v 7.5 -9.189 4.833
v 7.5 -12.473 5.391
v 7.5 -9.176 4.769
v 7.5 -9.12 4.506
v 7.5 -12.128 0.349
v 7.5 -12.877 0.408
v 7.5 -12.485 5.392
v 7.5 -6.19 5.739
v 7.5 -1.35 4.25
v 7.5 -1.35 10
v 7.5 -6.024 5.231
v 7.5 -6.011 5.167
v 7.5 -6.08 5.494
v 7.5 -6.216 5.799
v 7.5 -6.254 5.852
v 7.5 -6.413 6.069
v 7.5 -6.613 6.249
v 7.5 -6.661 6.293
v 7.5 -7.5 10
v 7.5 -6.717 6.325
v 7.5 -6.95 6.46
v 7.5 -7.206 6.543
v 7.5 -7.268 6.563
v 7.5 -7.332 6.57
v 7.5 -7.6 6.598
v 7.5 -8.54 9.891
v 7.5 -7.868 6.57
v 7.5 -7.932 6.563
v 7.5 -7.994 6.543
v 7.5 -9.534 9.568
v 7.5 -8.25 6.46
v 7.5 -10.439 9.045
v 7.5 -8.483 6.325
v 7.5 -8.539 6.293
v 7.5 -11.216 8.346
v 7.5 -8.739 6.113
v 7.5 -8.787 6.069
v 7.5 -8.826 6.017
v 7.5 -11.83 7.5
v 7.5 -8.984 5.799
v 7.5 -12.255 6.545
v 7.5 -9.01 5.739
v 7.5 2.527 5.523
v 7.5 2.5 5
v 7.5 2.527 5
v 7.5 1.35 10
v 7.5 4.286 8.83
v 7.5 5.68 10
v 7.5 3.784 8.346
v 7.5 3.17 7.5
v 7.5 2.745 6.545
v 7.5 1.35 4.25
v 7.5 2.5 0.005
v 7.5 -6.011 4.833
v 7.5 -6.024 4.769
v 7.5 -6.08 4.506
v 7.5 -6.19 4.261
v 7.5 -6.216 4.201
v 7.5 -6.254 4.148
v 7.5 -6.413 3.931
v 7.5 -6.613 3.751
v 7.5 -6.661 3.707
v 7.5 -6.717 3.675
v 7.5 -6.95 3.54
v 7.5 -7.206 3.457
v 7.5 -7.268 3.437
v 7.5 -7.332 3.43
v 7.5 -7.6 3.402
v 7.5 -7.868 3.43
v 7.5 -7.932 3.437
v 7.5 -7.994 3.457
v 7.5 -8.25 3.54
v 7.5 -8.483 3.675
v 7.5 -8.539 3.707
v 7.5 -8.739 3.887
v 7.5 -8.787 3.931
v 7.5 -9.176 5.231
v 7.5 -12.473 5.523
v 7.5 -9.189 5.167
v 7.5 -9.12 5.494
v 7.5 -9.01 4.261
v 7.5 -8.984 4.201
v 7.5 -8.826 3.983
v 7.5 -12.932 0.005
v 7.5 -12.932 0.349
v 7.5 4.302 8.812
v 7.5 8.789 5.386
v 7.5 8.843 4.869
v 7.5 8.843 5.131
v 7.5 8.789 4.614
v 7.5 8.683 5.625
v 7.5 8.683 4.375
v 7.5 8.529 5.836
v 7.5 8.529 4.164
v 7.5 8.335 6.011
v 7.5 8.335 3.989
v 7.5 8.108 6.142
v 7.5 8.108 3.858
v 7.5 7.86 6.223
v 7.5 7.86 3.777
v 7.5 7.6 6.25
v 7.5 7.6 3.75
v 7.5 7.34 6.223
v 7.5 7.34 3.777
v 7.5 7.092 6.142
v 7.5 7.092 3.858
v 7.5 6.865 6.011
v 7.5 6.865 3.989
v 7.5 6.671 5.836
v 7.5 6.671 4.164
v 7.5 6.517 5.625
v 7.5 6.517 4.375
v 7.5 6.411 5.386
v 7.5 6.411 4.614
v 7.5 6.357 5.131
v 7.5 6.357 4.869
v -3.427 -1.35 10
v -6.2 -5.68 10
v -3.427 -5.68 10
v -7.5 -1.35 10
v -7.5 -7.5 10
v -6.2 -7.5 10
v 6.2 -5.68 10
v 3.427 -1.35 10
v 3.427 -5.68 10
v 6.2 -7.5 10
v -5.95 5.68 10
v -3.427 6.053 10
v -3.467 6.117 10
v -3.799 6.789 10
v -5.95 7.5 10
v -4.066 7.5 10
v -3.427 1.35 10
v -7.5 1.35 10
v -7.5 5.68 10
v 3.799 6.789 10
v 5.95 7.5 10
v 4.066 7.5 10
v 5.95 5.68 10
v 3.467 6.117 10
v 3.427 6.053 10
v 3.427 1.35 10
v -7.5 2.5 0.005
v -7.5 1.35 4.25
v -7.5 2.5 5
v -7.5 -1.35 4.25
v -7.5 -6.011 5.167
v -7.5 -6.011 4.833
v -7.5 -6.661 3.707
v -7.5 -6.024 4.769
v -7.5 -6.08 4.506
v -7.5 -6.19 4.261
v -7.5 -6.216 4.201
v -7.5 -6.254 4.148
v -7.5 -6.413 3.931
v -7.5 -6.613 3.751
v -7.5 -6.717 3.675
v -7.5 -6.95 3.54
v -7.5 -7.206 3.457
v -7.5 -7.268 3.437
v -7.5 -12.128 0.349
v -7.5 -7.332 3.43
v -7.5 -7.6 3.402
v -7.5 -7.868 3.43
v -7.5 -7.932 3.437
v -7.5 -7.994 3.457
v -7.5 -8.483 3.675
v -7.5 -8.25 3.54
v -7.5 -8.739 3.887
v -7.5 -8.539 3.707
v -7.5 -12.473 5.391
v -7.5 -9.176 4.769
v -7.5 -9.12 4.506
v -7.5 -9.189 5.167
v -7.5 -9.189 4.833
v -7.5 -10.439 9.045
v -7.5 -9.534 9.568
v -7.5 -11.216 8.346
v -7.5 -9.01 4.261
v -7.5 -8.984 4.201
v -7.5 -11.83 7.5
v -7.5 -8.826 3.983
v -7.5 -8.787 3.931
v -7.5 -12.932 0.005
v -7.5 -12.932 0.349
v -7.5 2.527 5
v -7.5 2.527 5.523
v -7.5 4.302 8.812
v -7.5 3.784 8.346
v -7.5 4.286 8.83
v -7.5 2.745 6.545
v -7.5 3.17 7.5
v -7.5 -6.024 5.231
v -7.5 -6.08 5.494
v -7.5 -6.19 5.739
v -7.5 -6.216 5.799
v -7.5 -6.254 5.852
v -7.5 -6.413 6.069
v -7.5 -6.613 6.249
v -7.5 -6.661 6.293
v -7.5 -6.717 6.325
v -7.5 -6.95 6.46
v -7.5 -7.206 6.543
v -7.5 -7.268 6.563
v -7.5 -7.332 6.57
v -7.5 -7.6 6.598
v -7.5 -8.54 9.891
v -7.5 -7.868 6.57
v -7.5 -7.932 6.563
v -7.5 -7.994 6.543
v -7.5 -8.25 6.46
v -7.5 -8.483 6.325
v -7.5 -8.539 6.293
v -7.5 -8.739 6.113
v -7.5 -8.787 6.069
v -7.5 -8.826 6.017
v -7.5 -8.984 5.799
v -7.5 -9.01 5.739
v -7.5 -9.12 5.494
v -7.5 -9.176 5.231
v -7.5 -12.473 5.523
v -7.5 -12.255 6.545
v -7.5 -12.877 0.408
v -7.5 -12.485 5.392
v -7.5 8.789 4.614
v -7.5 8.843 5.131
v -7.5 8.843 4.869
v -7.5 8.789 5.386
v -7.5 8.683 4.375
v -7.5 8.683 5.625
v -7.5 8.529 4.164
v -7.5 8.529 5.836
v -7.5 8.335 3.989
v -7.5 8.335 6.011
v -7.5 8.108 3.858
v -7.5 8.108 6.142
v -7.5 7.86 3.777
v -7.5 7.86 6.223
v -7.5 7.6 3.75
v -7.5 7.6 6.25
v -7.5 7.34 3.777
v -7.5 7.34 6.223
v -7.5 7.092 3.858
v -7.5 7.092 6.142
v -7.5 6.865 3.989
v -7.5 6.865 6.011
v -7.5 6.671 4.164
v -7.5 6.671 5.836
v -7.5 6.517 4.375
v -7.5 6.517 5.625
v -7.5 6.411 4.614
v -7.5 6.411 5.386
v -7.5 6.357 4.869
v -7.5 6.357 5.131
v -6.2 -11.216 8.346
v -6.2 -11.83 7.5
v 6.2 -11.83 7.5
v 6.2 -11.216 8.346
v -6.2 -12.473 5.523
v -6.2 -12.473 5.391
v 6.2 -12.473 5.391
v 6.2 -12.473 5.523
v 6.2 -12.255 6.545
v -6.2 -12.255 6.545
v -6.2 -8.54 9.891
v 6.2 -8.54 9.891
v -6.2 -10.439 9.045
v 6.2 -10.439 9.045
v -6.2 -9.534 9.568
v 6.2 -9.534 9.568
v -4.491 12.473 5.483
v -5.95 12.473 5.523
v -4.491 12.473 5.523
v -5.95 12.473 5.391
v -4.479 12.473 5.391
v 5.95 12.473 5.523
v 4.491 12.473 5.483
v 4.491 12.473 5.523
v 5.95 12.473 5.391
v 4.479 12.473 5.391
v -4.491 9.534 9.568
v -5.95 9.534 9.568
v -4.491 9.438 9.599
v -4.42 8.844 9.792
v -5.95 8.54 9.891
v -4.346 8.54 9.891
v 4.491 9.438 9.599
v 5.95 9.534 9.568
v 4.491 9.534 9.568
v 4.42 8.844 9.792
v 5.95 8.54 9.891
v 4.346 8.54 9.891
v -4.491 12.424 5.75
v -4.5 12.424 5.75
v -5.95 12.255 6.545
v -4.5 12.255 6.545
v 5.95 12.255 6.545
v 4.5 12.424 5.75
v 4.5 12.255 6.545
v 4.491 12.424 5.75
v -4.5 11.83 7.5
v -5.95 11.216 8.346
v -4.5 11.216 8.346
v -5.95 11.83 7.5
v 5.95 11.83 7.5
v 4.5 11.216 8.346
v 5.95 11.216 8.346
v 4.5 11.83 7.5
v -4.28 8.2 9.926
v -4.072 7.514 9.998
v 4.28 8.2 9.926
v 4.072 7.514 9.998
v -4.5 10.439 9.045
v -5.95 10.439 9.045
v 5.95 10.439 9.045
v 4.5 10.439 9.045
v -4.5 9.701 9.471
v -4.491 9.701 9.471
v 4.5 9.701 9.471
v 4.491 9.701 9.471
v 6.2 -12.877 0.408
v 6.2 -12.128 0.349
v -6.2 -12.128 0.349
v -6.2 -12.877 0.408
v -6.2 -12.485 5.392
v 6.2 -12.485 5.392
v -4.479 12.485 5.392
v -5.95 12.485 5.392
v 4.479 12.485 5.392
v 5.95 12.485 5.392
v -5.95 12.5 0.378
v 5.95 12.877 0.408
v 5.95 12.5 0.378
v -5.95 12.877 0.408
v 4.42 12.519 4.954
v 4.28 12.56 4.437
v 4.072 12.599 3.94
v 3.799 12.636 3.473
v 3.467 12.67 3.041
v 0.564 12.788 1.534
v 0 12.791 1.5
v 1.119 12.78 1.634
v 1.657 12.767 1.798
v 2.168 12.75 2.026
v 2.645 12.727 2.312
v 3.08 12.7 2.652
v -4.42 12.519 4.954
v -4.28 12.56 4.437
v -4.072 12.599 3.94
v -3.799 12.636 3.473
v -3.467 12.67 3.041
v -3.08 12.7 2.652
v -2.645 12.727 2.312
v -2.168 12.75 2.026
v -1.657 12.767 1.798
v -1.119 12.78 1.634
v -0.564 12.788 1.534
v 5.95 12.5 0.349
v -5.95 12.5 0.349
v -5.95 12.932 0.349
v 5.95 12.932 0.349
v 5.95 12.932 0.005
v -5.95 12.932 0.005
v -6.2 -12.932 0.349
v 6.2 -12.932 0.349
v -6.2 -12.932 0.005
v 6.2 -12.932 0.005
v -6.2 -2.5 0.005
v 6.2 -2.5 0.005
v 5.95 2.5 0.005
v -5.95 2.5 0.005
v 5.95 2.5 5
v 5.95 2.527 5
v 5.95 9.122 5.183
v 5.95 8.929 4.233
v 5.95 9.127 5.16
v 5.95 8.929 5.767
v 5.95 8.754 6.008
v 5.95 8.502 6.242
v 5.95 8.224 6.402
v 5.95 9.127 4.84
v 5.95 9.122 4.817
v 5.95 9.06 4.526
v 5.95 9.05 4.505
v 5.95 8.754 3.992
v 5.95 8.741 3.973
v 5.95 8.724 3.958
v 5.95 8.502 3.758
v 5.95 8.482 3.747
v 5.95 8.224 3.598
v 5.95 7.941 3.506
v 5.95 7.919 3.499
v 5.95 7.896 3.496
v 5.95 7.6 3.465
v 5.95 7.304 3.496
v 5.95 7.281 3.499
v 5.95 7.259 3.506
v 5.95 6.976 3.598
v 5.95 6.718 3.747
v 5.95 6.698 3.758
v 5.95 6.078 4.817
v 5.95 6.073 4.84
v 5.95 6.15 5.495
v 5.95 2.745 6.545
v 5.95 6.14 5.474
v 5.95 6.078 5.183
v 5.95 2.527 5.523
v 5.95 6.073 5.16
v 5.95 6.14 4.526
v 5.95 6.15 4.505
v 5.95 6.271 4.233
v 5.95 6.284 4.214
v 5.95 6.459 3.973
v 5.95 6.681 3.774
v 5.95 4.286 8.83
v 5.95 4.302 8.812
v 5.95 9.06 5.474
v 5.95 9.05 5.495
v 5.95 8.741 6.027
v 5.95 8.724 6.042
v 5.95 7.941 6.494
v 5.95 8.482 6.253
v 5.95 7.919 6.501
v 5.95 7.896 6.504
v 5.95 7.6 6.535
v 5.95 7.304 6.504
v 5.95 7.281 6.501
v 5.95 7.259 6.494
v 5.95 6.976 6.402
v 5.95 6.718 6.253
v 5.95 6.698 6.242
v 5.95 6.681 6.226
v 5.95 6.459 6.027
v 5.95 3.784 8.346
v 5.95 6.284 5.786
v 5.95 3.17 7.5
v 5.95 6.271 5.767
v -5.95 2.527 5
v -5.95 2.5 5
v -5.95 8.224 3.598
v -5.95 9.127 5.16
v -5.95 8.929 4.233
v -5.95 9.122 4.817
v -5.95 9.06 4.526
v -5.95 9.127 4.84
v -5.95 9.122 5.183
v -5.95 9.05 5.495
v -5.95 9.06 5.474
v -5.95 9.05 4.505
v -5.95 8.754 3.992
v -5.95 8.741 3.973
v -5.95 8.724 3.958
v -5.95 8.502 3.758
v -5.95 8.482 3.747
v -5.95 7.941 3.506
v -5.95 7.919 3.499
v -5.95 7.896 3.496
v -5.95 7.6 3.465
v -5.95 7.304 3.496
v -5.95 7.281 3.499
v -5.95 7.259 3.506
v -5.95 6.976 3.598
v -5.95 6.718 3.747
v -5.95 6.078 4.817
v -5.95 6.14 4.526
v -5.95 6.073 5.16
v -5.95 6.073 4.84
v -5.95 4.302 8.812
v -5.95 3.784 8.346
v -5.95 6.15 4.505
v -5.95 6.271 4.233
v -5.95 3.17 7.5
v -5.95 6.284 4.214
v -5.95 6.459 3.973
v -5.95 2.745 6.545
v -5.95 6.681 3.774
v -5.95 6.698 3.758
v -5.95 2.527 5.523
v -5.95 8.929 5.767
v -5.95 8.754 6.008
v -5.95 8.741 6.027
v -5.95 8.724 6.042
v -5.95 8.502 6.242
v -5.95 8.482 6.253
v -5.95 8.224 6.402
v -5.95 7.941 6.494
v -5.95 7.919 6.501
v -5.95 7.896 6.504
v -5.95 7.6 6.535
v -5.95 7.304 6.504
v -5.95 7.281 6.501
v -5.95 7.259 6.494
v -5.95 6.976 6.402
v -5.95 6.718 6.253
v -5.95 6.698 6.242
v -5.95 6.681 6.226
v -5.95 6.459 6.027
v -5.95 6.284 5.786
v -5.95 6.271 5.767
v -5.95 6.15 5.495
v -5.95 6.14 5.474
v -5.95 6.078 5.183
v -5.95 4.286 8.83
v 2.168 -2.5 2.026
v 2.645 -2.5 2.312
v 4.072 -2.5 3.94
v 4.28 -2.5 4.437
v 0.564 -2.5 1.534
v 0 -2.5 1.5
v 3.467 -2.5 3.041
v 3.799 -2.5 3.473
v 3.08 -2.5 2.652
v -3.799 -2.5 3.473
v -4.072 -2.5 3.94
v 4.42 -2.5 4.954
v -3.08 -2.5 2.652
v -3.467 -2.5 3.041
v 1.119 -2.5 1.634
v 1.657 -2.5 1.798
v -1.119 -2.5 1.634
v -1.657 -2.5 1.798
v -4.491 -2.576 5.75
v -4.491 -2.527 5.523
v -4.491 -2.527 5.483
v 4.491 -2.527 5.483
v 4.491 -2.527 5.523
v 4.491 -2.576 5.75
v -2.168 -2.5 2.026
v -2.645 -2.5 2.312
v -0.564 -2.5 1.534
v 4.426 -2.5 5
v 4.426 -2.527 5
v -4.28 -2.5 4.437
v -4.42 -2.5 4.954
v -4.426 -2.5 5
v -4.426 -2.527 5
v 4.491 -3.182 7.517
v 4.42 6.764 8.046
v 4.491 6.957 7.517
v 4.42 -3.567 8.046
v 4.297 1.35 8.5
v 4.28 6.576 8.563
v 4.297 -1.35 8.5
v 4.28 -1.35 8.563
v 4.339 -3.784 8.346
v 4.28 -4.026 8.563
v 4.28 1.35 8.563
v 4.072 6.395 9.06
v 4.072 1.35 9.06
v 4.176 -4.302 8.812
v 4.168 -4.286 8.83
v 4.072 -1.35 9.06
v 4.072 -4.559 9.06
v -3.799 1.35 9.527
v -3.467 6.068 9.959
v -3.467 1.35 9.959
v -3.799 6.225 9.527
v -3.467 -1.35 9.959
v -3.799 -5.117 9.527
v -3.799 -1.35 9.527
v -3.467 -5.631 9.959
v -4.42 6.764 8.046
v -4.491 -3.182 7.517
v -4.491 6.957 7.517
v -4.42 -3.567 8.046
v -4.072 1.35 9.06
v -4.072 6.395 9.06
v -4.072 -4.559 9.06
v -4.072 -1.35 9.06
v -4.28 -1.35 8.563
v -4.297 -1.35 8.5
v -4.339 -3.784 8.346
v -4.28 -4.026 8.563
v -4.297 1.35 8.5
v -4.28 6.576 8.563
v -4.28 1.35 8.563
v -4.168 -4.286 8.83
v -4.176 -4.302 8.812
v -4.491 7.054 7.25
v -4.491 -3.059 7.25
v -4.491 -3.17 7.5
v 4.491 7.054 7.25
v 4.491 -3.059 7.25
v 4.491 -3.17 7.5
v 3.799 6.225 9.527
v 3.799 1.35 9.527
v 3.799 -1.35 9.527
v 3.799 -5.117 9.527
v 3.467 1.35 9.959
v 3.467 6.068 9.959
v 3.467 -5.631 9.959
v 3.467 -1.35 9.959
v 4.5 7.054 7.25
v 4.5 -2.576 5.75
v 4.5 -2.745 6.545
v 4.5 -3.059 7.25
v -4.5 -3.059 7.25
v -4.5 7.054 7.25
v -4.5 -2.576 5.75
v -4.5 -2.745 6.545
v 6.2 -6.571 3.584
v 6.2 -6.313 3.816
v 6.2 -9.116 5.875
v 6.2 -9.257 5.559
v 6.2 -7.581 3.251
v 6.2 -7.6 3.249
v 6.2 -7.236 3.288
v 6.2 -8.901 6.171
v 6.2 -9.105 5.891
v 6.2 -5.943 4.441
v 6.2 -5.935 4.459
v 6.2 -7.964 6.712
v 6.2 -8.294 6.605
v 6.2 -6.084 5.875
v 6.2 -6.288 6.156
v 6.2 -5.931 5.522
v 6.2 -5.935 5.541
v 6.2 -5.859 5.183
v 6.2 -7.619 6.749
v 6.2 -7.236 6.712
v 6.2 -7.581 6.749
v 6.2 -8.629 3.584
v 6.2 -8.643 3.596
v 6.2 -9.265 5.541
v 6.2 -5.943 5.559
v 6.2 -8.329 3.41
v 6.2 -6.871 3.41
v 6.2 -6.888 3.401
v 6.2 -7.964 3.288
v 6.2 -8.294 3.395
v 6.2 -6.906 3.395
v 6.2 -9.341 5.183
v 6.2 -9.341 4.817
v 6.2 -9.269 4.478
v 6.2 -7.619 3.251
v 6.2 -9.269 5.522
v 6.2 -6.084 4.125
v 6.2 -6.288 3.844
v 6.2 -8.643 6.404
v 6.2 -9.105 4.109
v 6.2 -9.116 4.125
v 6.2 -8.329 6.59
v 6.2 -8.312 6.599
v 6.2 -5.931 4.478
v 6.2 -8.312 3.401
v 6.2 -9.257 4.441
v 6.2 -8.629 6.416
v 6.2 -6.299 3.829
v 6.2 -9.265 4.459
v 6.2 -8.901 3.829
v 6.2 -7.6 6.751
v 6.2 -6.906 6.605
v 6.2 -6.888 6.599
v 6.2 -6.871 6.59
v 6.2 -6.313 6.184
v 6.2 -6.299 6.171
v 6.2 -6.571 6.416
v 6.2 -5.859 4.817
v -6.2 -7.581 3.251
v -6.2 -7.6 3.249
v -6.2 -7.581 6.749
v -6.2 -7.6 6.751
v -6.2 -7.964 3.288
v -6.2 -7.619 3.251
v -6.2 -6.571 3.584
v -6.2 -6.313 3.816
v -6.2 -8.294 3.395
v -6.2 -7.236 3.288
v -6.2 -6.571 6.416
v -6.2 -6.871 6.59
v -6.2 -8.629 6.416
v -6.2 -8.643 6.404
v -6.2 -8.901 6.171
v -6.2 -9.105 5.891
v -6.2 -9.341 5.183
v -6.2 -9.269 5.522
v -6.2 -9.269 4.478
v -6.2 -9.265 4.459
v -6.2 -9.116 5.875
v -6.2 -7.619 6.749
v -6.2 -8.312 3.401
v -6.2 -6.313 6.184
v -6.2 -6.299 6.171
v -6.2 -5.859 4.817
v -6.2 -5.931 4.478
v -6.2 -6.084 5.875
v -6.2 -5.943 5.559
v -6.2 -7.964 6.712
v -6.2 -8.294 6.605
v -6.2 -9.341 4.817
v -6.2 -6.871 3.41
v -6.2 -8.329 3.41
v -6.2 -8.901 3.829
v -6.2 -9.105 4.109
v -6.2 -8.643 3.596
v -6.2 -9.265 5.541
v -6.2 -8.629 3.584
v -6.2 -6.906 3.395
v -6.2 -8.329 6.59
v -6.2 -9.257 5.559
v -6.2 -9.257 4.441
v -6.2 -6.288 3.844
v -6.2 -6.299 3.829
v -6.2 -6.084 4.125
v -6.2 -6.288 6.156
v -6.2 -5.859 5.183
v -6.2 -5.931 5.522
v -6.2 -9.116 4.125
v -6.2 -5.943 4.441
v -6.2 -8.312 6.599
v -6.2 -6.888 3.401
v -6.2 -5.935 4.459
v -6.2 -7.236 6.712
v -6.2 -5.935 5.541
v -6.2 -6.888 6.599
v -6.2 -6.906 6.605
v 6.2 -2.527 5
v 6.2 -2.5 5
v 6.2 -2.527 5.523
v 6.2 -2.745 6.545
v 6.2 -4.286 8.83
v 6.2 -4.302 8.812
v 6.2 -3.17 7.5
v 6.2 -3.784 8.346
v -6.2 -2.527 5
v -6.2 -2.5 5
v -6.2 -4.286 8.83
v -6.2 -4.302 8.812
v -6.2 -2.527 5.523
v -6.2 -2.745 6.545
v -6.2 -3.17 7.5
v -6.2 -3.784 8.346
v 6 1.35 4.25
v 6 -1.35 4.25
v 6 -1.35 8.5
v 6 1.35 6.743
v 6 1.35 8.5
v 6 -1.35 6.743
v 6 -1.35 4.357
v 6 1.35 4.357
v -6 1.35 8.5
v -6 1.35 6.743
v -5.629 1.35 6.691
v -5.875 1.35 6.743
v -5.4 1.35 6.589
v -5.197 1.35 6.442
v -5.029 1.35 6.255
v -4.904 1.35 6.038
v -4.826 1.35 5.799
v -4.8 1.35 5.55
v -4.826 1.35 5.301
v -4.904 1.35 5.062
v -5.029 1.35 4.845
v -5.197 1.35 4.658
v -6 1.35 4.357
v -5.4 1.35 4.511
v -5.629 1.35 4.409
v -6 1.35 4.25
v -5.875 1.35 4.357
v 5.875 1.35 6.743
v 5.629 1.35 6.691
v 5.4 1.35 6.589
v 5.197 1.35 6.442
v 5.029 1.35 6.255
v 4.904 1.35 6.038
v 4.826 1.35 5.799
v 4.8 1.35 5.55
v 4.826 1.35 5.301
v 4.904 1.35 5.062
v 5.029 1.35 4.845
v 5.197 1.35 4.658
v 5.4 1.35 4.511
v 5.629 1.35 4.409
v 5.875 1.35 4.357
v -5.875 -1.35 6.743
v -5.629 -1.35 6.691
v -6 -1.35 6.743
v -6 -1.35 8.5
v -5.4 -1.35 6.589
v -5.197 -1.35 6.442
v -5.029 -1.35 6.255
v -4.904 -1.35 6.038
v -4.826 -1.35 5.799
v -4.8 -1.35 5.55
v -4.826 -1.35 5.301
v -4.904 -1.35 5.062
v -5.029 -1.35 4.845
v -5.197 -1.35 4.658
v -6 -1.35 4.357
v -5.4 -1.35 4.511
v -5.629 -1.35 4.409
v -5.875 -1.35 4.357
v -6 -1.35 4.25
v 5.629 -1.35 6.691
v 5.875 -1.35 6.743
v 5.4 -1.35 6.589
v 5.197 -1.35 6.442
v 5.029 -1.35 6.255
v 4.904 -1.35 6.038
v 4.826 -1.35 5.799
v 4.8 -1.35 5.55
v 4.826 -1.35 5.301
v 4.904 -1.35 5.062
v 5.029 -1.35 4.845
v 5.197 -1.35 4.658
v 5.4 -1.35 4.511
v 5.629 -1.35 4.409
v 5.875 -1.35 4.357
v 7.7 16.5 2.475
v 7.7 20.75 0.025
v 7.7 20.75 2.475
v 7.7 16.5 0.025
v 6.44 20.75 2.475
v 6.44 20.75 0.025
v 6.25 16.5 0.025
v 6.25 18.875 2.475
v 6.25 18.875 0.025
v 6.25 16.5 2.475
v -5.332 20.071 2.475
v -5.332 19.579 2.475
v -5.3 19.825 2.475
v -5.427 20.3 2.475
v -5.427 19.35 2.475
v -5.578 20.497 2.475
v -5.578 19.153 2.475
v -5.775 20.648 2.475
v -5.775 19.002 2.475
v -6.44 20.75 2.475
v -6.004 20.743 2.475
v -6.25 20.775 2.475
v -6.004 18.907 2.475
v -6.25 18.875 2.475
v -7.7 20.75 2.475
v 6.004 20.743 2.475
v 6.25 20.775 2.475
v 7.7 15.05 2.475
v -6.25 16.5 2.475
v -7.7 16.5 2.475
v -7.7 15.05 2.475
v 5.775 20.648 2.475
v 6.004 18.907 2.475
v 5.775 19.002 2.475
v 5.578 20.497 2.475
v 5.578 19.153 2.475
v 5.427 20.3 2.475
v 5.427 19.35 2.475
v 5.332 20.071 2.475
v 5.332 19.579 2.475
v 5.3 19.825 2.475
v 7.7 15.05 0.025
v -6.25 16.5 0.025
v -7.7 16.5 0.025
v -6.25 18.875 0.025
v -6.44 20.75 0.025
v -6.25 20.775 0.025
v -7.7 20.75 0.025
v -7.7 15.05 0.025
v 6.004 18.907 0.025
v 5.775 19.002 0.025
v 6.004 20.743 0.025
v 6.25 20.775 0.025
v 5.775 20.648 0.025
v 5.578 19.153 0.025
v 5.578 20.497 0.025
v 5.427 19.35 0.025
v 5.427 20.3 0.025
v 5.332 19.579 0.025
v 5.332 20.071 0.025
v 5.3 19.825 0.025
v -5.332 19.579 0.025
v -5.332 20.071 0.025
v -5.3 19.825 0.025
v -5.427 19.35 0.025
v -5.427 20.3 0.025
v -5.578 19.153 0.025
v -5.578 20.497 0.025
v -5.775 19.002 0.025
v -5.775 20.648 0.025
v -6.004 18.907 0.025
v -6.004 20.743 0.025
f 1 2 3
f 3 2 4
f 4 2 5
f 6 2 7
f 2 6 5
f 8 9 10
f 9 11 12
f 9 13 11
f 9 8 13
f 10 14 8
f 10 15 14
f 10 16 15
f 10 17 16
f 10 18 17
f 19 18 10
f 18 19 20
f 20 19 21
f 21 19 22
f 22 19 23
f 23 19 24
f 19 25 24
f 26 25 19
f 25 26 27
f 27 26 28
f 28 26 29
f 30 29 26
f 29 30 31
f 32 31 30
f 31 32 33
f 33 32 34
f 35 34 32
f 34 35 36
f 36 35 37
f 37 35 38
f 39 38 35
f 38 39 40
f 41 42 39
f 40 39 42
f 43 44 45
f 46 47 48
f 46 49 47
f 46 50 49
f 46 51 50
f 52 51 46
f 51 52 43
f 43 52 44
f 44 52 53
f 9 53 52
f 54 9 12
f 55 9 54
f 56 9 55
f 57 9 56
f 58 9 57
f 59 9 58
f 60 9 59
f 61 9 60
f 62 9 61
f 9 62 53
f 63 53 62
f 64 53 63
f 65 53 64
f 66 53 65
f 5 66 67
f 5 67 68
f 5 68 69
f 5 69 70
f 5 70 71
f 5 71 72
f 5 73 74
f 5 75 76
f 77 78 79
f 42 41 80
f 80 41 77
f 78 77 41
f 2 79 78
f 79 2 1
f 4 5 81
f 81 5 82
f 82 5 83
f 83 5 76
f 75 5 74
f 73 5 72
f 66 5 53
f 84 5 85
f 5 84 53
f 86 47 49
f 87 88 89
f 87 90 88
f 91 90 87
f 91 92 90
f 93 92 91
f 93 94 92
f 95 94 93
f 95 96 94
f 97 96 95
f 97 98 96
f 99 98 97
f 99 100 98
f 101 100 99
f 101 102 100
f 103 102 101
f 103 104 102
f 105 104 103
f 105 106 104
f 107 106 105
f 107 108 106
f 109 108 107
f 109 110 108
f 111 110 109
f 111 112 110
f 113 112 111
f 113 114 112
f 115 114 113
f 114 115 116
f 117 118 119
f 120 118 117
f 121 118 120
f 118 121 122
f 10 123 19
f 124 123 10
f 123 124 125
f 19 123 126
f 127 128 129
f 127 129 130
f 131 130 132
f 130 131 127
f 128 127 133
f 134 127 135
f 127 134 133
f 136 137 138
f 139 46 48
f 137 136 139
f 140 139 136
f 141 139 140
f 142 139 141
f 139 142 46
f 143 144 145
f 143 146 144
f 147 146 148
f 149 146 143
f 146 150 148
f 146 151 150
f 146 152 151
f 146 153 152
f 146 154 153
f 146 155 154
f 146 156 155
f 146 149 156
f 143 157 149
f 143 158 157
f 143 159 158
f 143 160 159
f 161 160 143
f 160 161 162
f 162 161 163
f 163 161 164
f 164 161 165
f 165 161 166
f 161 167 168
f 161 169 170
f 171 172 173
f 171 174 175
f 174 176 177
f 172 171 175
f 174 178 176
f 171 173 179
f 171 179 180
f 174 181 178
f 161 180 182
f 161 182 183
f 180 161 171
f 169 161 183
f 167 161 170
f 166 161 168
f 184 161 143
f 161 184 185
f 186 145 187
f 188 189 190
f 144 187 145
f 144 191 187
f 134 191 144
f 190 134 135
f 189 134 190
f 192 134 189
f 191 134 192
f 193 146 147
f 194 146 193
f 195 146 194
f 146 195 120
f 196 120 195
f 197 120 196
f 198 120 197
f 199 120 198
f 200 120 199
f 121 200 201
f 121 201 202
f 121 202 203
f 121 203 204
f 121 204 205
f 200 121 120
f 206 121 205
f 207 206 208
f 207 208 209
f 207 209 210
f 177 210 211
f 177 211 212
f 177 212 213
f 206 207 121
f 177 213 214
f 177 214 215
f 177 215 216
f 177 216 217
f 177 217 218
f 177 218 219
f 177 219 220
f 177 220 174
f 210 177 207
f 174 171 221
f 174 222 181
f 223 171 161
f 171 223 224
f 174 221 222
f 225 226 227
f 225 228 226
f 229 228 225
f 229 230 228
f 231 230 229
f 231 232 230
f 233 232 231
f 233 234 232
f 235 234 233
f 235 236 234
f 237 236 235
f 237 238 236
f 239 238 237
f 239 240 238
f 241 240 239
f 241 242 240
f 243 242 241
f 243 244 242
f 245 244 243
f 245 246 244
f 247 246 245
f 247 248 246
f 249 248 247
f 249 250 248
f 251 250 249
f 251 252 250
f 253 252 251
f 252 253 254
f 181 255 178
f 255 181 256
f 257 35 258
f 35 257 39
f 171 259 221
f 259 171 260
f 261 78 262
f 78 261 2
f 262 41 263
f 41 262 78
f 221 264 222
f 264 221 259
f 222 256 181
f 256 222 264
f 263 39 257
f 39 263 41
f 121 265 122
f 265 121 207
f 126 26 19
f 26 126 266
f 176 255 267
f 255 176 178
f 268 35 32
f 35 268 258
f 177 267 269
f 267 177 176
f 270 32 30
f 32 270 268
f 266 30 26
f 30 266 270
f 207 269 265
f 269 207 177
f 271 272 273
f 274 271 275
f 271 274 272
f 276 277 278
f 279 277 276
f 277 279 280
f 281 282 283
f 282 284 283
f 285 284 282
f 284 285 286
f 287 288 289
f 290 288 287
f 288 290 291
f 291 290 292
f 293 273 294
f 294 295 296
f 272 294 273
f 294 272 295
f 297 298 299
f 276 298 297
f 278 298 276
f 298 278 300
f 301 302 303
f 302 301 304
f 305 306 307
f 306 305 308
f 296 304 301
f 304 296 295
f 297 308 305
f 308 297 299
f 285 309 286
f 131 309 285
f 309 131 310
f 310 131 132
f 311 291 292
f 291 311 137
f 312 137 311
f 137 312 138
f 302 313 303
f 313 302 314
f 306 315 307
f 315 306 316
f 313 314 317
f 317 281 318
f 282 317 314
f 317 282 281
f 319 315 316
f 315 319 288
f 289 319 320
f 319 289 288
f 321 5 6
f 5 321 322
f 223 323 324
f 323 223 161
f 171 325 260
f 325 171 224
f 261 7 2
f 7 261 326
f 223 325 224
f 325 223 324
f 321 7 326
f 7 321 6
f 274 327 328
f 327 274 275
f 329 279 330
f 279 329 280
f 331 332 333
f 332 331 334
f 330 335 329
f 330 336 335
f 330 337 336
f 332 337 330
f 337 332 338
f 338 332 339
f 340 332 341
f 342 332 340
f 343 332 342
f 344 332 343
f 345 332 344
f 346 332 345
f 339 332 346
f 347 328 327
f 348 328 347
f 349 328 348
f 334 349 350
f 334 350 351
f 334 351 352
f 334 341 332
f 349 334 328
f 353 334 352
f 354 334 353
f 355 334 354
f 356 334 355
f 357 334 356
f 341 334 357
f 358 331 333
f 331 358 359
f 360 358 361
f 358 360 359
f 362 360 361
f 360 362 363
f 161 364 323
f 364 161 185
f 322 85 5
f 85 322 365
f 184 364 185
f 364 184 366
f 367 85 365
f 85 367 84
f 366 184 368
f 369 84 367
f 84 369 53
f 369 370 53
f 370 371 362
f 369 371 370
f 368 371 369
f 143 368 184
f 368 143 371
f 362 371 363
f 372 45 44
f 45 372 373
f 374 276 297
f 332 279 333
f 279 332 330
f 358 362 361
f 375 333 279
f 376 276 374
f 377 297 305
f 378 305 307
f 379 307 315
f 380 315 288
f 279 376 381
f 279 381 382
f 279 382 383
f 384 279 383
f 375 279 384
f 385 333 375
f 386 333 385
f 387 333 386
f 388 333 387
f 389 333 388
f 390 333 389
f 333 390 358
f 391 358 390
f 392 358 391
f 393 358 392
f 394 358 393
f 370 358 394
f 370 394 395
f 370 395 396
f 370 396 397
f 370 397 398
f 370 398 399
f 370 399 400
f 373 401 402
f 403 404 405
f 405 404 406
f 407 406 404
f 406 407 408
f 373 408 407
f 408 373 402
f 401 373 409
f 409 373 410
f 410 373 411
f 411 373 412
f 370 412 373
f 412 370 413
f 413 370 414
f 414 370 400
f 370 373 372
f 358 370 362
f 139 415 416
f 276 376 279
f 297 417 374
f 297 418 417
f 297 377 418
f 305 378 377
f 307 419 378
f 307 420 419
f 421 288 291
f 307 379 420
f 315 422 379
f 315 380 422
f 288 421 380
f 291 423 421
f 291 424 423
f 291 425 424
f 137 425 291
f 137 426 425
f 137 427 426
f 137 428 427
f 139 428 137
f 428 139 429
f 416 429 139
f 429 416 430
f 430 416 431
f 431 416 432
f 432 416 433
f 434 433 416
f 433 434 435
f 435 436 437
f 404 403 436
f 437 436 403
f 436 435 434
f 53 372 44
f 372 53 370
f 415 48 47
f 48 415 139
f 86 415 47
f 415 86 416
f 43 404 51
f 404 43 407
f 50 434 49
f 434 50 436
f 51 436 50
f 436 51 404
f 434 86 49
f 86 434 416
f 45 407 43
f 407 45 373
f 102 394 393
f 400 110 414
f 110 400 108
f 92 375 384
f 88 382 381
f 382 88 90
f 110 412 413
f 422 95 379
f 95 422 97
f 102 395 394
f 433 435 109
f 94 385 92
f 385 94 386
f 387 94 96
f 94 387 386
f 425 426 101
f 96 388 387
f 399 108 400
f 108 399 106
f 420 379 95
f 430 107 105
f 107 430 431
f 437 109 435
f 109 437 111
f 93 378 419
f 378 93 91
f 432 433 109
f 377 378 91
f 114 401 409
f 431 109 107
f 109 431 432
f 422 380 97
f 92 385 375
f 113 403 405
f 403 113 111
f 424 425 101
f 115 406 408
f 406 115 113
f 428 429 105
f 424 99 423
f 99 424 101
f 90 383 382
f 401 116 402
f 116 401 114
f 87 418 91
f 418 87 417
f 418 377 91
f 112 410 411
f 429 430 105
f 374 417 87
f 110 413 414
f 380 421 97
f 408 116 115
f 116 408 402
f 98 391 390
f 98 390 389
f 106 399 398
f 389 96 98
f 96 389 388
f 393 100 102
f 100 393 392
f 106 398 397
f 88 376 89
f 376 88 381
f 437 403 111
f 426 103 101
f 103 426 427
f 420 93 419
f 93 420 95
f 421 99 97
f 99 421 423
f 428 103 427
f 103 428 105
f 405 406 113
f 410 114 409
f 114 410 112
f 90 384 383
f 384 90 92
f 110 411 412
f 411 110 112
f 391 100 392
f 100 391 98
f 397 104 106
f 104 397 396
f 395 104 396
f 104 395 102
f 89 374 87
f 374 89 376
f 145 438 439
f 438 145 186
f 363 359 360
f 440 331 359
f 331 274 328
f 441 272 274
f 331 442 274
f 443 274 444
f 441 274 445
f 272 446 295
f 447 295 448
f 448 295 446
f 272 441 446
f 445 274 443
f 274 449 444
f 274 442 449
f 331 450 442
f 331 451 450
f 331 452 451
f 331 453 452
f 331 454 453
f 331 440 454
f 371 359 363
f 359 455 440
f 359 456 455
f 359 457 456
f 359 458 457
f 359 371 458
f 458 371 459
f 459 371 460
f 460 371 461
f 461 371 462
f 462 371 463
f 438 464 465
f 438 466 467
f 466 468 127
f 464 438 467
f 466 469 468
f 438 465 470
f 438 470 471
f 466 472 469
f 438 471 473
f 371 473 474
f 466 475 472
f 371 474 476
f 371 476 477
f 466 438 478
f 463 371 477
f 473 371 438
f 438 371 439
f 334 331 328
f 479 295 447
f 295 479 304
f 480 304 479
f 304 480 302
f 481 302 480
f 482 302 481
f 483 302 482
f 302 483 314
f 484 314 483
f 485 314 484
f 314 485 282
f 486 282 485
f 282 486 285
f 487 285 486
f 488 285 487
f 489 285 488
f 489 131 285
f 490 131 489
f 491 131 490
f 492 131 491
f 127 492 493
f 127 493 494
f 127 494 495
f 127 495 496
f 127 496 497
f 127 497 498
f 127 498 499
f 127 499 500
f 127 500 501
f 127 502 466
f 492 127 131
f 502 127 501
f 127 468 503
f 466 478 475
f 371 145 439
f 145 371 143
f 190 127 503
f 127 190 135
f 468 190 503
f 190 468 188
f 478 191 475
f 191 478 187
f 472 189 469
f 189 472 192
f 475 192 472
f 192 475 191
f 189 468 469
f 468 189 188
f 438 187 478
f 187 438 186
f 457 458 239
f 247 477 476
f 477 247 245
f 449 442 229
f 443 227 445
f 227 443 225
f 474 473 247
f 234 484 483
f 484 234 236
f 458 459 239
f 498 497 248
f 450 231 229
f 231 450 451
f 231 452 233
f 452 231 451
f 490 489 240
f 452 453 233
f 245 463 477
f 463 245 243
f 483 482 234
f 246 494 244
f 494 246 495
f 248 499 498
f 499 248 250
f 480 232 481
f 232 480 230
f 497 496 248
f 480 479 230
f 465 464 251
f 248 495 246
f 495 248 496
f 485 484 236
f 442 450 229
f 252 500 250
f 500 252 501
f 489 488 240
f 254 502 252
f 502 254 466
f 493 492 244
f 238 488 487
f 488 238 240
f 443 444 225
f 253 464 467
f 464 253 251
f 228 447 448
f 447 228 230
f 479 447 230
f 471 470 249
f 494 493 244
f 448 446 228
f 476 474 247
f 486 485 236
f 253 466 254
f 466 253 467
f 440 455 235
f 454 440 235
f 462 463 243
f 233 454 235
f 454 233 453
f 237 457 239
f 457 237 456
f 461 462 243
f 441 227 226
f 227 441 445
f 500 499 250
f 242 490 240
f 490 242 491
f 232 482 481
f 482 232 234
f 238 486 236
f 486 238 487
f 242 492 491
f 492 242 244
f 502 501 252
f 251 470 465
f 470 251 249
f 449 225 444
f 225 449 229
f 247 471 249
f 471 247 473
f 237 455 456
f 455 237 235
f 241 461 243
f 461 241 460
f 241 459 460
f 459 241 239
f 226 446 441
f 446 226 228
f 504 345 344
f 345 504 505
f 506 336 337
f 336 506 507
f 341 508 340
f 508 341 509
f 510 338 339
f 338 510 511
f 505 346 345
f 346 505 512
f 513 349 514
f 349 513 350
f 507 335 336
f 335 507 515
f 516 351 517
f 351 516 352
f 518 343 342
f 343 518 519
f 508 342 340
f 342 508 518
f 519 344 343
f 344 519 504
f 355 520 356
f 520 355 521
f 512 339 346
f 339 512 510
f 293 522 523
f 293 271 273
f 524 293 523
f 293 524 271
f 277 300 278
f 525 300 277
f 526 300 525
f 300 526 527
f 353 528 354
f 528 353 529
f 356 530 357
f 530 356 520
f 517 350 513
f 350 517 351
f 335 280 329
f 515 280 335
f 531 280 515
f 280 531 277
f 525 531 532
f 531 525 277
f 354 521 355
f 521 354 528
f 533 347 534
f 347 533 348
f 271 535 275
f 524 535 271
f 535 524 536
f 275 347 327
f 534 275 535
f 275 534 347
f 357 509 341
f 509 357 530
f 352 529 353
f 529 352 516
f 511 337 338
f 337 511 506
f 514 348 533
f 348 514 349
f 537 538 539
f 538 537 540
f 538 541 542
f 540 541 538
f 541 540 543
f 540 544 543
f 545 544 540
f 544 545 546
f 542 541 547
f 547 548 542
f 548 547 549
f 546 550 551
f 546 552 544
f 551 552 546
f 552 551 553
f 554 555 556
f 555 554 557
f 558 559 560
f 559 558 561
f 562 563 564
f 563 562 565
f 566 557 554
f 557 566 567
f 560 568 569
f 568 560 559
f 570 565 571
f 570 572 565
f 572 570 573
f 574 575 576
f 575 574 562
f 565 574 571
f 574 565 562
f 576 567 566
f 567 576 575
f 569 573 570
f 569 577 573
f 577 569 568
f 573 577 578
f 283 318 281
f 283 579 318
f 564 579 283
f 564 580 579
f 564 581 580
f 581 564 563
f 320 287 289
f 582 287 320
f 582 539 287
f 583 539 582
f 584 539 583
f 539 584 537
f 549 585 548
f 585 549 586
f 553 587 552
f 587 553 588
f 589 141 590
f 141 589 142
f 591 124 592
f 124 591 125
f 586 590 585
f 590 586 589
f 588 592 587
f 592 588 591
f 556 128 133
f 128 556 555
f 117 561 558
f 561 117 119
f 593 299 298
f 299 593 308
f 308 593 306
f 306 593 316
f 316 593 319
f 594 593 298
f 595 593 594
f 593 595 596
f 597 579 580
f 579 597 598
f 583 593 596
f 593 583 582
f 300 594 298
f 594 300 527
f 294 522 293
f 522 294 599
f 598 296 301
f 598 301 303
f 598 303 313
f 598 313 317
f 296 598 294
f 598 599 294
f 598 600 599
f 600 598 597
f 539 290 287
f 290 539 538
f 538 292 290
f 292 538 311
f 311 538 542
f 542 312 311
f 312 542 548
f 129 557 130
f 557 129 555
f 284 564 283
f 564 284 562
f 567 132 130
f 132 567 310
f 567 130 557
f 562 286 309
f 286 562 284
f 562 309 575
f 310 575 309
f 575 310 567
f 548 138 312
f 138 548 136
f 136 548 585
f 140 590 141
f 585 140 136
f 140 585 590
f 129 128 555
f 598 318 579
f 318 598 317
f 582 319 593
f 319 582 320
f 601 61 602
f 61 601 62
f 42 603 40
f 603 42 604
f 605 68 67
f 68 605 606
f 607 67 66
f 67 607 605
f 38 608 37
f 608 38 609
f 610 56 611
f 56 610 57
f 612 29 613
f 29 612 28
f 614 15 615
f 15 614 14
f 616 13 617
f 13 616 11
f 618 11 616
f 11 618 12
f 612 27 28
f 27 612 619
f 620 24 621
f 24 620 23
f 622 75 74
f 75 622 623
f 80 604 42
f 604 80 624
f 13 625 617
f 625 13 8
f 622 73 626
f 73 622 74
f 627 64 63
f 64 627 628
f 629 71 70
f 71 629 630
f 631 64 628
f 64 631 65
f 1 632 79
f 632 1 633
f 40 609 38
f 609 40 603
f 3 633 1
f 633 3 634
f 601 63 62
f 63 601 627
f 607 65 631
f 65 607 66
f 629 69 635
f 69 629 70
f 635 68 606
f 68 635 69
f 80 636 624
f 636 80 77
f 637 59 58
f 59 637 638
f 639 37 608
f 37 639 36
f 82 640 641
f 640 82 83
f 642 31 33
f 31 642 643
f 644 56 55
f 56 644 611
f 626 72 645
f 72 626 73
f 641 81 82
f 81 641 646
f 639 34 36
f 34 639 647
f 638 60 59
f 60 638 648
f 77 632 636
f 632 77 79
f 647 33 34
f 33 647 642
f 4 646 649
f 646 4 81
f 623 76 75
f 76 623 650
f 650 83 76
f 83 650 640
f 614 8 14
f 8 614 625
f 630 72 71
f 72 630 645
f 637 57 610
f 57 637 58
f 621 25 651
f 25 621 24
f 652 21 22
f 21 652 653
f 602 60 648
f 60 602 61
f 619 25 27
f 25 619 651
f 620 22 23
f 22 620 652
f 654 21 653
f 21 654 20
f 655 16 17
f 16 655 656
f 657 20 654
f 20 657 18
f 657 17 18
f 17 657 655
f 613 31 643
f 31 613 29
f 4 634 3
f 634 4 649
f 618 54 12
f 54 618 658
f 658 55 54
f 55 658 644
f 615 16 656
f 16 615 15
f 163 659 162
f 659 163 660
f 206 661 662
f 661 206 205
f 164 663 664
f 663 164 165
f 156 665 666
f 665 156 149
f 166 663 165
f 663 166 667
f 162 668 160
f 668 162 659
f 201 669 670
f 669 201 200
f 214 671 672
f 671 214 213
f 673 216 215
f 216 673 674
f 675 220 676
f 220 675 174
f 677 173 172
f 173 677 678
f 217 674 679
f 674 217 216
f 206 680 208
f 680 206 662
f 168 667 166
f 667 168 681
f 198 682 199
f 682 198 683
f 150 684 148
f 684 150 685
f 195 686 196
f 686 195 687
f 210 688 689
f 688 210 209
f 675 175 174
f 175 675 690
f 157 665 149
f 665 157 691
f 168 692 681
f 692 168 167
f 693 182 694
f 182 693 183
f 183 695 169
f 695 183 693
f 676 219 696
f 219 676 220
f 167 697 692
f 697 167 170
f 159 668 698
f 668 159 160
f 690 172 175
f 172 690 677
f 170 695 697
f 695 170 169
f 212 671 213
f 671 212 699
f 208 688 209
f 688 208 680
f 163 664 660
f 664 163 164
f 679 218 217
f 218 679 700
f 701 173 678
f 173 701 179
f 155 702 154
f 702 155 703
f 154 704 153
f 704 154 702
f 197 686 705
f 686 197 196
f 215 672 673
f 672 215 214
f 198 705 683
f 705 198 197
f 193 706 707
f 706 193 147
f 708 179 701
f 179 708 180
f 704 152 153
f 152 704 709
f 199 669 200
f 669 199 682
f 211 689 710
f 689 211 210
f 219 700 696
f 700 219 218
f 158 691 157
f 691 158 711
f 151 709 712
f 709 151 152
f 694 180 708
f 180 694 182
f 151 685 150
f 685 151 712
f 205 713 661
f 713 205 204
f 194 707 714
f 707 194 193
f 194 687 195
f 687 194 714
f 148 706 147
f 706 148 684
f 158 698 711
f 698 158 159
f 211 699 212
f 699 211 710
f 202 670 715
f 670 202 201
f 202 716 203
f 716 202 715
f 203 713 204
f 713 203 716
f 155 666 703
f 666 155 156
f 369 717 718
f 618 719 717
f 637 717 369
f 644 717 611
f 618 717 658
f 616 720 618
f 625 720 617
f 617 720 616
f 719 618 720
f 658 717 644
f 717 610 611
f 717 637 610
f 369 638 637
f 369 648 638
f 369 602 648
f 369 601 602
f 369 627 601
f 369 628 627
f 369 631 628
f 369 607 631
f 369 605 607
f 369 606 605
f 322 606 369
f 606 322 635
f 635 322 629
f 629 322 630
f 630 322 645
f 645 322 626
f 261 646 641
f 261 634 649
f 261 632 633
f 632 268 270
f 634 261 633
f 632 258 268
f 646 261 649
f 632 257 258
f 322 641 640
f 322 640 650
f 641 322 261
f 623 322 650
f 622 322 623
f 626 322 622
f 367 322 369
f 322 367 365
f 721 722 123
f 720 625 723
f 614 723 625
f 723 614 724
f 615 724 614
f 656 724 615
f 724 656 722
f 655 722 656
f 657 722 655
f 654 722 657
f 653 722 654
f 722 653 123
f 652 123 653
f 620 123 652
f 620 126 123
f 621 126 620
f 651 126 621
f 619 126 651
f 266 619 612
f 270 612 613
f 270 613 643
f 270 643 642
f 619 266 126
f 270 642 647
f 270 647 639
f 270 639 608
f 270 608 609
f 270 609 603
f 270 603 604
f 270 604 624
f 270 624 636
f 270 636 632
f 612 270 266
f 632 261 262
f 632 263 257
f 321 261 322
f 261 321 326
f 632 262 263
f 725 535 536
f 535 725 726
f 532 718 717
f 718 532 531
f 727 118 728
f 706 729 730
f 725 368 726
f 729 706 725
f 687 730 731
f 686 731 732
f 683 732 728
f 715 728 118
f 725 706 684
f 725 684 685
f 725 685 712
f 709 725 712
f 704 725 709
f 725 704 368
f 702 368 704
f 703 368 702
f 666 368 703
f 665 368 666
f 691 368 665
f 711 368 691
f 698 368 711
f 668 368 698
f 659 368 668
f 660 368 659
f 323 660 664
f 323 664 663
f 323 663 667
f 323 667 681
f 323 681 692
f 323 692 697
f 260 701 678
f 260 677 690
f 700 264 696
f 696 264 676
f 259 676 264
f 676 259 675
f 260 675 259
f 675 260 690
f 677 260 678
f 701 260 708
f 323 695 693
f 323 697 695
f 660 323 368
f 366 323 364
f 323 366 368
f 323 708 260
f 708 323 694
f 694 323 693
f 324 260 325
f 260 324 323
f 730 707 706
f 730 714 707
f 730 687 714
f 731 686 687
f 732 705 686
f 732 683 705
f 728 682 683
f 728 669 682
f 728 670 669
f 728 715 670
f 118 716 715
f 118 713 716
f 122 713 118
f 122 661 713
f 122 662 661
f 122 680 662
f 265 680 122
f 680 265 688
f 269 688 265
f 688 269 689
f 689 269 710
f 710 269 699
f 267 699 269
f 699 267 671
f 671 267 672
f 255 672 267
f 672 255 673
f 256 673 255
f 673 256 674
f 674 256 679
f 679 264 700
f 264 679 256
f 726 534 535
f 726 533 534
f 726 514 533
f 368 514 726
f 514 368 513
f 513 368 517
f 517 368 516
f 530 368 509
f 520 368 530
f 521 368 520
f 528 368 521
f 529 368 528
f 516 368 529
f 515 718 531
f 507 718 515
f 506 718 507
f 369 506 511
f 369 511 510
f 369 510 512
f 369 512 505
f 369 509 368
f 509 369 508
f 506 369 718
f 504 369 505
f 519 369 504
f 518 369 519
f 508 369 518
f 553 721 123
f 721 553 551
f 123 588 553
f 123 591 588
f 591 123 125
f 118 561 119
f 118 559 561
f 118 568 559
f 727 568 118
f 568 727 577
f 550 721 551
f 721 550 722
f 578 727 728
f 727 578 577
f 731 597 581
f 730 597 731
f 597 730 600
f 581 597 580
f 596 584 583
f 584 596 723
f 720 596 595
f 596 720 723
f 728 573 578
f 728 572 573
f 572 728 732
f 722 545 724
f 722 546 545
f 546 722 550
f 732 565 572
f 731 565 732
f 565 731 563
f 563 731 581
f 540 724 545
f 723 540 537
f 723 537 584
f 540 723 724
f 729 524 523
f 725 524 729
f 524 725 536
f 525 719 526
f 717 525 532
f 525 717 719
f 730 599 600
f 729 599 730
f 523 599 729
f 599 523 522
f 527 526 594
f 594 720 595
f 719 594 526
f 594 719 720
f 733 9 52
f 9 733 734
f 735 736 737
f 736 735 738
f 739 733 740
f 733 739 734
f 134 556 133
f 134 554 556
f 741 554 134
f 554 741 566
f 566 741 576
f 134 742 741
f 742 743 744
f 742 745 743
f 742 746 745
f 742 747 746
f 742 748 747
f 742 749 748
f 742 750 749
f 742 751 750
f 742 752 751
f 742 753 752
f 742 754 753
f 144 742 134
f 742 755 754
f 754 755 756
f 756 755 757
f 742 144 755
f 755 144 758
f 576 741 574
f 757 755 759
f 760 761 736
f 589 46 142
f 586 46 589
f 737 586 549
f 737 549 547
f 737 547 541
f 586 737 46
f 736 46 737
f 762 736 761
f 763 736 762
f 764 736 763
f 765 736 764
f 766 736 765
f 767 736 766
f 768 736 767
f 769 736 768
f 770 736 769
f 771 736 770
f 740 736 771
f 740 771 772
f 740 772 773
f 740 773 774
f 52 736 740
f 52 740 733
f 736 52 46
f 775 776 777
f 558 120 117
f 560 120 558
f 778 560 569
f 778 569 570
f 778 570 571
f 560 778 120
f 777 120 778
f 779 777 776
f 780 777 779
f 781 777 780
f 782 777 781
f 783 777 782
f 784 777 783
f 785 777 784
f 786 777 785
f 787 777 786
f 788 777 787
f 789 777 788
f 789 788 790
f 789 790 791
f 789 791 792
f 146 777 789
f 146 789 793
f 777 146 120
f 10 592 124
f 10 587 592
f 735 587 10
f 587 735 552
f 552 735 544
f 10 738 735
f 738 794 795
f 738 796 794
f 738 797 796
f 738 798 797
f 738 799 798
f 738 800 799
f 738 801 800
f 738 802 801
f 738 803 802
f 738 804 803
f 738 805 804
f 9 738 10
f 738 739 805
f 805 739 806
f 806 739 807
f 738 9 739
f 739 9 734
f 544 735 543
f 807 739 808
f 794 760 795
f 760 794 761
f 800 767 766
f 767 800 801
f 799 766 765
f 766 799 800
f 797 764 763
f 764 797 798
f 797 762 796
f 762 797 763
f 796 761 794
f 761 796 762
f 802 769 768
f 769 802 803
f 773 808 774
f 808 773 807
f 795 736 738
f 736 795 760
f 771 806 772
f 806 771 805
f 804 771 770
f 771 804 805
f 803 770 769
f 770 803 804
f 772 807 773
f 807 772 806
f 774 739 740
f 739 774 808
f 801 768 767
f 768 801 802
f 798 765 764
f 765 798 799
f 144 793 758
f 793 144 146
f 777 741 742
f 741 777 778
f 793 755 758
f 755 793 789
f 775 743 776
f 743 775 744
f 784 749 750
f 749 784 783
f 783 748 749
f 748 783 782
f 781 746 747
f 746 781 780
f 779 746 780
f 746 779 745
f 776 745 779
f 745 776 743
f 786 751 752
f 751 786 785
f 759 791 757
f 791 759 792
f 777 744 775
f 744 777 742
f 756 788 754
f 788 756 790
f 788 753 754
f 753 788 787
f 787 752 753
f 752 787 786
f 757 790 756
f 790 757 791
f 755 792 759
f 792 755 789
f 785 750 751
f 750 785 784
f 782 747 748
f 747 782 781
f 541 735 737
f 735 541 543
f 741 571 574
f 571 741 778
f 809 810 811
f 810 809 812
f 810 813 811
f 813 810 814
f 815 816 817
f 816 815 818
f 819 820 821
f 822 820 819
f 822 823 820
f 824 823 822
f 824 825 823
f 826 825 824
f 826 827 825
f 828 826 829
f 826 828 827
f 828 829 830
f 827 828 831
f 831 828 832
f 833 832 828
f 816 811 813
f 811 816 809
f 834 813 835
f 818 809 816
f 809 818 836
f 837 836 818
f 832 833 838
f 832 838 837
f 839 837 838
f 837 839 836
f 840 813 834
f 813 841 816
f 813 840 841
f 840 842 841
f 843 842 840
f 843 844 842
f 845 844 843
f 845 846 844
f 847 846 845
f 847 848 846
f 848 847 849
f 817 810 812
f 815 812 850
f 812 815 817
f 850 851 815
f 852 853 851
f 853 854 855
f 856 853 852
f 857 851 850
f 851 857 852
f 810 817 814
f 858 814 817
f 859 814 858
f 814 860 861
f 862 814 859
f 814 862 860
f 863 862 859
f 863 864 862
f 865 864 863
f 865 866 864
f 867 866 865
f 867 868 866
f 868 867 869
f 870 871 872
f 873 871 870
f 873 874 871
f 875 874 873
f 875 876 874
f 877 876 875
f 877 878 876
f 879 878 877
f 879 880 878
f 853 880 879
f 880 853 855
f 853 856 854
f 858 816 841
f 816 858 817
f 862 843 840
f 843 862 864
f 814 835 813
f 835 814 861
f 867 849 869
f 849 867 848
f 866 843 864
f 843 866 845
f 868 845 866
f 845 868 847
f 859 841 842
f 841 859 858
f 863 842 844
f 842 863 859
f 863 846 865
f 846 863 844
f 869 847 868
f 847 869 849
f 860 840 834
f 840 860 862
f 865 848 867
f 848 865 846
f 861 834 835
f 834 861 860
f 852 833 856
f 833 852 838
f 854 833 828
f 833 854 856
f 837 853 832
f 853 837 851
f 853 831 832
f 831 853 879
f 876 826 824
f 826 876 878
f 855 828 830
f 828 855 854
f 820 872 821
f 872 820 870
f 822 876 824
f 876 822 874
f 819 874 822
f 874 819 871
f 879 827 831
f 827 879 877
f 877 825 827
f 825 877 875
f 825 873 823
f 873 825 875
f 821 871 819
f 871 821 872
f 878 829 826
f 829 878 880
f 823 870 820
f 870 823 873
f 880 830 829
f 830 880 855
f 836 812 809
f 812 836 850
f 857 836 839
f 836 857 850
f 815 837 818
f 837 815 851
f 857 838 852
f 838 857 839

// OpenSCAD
/*
Original Code by Joerg Scheuermann: https://www.thingiverse.com/Joerg
Original on Thingiverse: https://www.thingiverse.com/thing:8239

Clip module, Toothpick diameter Variable,
OpenSCAD/Thingiverse Customizer optimization,
Multicolor Modifier Block and extra comments
added by Gasol1n (Christian Riedl): https://www.gasol1n.com/
                                                        https://www.thingiverse.com/Gasolin

Licensed under CC BY-SA 3.0
https://creativecommons.org/licenses/by-sa/3.0/
*/

/* [Size] */
// Width of the Chain Link
width= 15;
// Length of the Chain Link
length=25;
// Height of the Chain Link
height=10;

/* [Hidden] */
// maximum allowed bending-angle
max_angle = 40; 

/* [Angles] */
// max. angle allowed to bend downwards
under_angle=-4.5; // [50]
// max. angle allowed to bend upwards
over_angle=40; // [50]

/* [Variant] */
// true - connectors go from outside to inside; false - vise versa
inner_axis=0; // [1:true, 0:false]
// true - top is closed, no holes/clip; false - top is open
closed=0; // [1:true, 0:false]
// true - a clip is used an generated instead of the toothpick hole; only works if closed=false
clip=1; // [1:true, 0:false]

/* [Further Settings] */
// Tolerance for better fit
tolerance = 0.2;
clip_extra_width = 0.5;
clip_extra_tolerance=0.05;
// Diameter of the toothpick
toothpick = 2.1; 
// Generate Modifier Block for Multicolor Stripe
multicolor_block=0; // [1:true, 0:false]
//Height of the Modifier (Multicolor) Block
mcb_height=2;

module outline(width, length, height, radius, l1, angle)
{
	y_ofs = l1 / 2;
	t = radius / 2;  // radius  = height / 2 --> t = height / 4 

	difference() {
		union() {
			translate([0, 0, height/2])    cube([width,l1,height], true);
			translate([0, -y_ofs, radius]) rotate([0, 90, 0]) cylinder(width, r = radius, center = true, $fs=0.5);
			translate([0,  y_ofs, radius]) rotate([0, 90, 0]) cylinder(width, r = radius, center = true, $fs=0.5);
			translate([0, -y_ofs, radius]) rotate([angle,     0, 0]) translate([0, -t, -t]) cube([width,radius,radius], true);
			translate([0,  y_ofs, radius]) rotate([360-angle, 0, 0]) translate([0,  t, -t]) cube([width,radius,radius], true);
            // Add material so that the base doesn't hang in the air
            translate([0,  y_ofs, radius]) rotate([360, 0, 0]) translate([0,  t, -t]) cube([width,radius,radius], true);  //  modification from original: duplicated without under angle subtraction, to make the part rest on the baseplane
            translate([0,  radius*(28*(1-cos(angle)))+y_ofs, 0]) rotate([360, 0, 0]) translate([0,  t, 0.5*radius*sin(4)]) cube([width,radius,radius*sin(4)], true);  //  modification from original: duplicated without under angle subtraction, to make the part rest on the baseplane
            // Add material so that the base doesn't hang in the air
            translate([0,  -radius*(28*(1-cos(angle)))-length/2, 0]) rotate([360, 0, 0]) translate([0,  t, 0.5*radius*sin(4)]) cube([width,radius,radius*sin(4)], true);  //  modification from original: duplicated without under angle subtraction, to make the part rest on the baseplane
            translate([0,  -length/2, 0]) rotate([360, 0, 0]) translate([0,  t, 0.5*radius*sin(4)]) cube([width,radius,radius*sin(4)], true);  //  modification from original: duplicated without under angle subtraction, to make the part rest on the baseplane
            //translate([0, 0, -(t/2)]) cube([width,length,t], true);
            }
		translate([0, 0, -(t/2)+0.005]) cube([width,length*2,t], true);  //  modification from original: +0.005 added for bug patch
	}
}

module axis(x_ofs, y_ofs, z_ofs, length, radius)
{
	rad = (radius * 0.25);
	translate([x_ofs,y_ofs,z_ofs]) rotate([0, 90, 0]) cylinder(length+tolerance, r1 = rad*1.25, r2 = rad, center = true, $fs=0.25);
}

module axis_hole(x_ofs, y_ofs, z_ofs, length, radius)
{
	rad = (radius * 0.25) * 1.25;
	translate([x_ofs,y_ofs,z_ofs]) rotate([0, 90, 0]) cylinder(length+tolerance, r1 = rad+tolerance, r2 = rad, center = true, $fs=0.25);
}

module outcut0(width, radius, h1, thick, angle, inner_axis)
{
	w = (width - thick)/2;
	t = thick + tolerance/2;

	translate([w, 0, 0]) union() {
		difference() {
			union() {
				translate([0,0,h1/2]) cube([t,radius*2, h1], true);
                translate([0,h1/2,h1/2]) cube([t,radius*2, h1], true); // modification from original: added for bug patch
				translate([0,0,h1]) rotate([angle, 0, 0]) translate([0,radius/2,0]) cube([t,radius,radius*2], true);
				translate([0,0,h1]) rotate([0, 90, 0]) cylinder(t, r = radius, center = true, $fs=0.5);
				if (inner_axis) {
					axis_hole(-(1.5*w), tolerance/2, h1,w,radius);
				}
			}
			if (!inner_axis) {
				axis(-(tolerance)/2, tolerance/2, h1,thick,radius);
			}
		}
	}
}
module outcut(width, radius, l1, h1, thick, angle, inner_axis)
{
	translate([0,l1/2,0]) union() {
		outcut0(width, radius, h1, thick, angle, inner_axis);
		mirror([1,0,0]) outcut0(width, radius, h1, thick, angle, inner_axis);
	}
}

module incut(width, radius, l1, h1, thick, angle, inner_axis)
{
	width2 = width - 2*(thick-tolerance);

	translate([0,-(l1/2),h1]) difference() {
		union() {
			translate([0,0,-(h1/2)]) cube([width2,radius*2,h1], true);
            translate([0,-h1/2,-(h1/2)]) cube([width2,radius*2,h1], true);  // modification from original: added for bug patch
			translate([0,0,0]) rotate([180-angle,0,0]) translate([0,radius/2,0]) cube([width2, radius, radius*2], true);
			translate([0,0,0]) rotate([0, 90, 0]) cylinder(width2, r = radius, center = true, $fs=0.5);
			if (!inner_axis) {
				axis_hole((width-thick)/2+tolerance, -(tolerance/2), 0,thick,radius);
				mirror([1,0,0]) axis_hole((width-thick)/2+tolerance, -(tolerance/2), 0,thick,radius);
			}
		}
		if (inner_axis) {
			axis(-((width2-thick)/2), -(tolerance/2), 0,thick,radius);
			mirror([1,0,0]) axis(-((width2-thick)/2), -(tolerance/2), 0,thick,radius);
		}
	}
}

module middle_0(length, radius, thick, closed)
{
	if (closed) {
		cube([radius*2,length,radius*2], true);
	} else {
		rotate([90, 90, 0]) cylinder(length, r = radius, center = true, $fn=50);
		translate([0,0,thick]) rotate([90, 90, 0]) cylinder(length, r = radius, center = true, $fn=50);
		translate([0,0,thick/2]) cube([2*radius,length,thick], true);
	}
}  //middle_0(10, 10, 10, false);
module middle(width, radius, length, height, l1, h1, thick, over, under, inner_axis, closed)
{
	l = length;
	th = max(thick,thick * height/width);
	h = height - (closed ?2 :1)*th;
	w = width - 4*thick;
	r = h / 2;
	scale(v=[w/h,1,1]) translate(v = [0,0,r+th]) union() {
		translate([0,h1,0]) middle_0(l, r, th, closed);
		translate([0,(l1/2)+0.1,0]) {
			difference() {
				rotate([over,0,0]) union() {
					translate([0, l/4, 0]) middle_0(l/2, r, th, closed);
					translate([0, l/4,-r]) cube([2*r,l/2,2*r], true);
				}
				translate([0, l/4,-r]) cube([2*r,l/2,2*r], true);
			}
			difference() {
				union() {  // moved thed rotate to affect only the middle_0 module
					rotate([-under,0,0]) translate([0, l/4, 0]) middle_0(l/2, r, th, closed);
					translate([0, l/4,r]) cube([2*r,l/2,2*r], true);
				}
				translate([0, l/4,r]) cube([2*r,l/2,2*r], true);
			}
		}
	}
}

module clip(width, height, length, tol=0)
{
    tol2 = tol * 2;
    cwidth = (length/10)+tol;
    cthickness = 1.5+tol;
    clength = 5;
    ccylinder = 2+tol2;
    translate([0, 0, height-(cthickness-tol2)/2])union(){
        cube([width+tol2, cwidth, cthickness], true);
        translate([width/2-(cthickness-tol2)/2, 0, -clength/2])union(){
            cube([cthickness, cwidth, clength+tol], true);
            translate([-cthickness/2, 0, -(clength/2-ccylinder/2)])rotate([90, 0, 0])cylinder(cwidth, r = ccylinder / 2, center= true, $fs=0.25);
        }
        translate([-(width/2-(cthickness-tol2)/2), 0, -clength/2])rotate([0, 0, 180])union(){
            cube([cthickness, cwidth, clength+tol], true);
            translate([-cthickness/2, 0, -(clength/2-ccylinder/2)])rotate([90, 0, 0])cylinder(cwidth, r = ccylinder / 2, center= true, $fs=0.25);
        }
    }
}

module hole(width, height, closed)
{
	if (!closed) {
		translate([0,0,height-1.5]) rotate([0, 90, 0]) cylinder(width+1, r = toothpick / 2, center = true, $fs=0.25);
	}
}

module chain_link(width, length, height, under_angle, over_angle, inner_axis, closed, clip)
{
	thick = min(2,max(1, 0.1*width));
	radius = height / 2;
	clip_len = max(length, 2*(height+thick));
	l1     = clip_len - (2 * radius);
	h1     = radius;
	under  = min(max_angle, under_angle);
	over   = min(max_angle, over_angle);

	difference() {
		outline(width, clip_len, height, radius, l1, under);
		outcut(width, radius, l1, h1, thick, over,  inner_axis);
		middle(width, radius, clip_len, height, l1, h1, thick, over, under, inner_axis, closed);
		incut(width, radius, l1, h1, thick, over, inner_axis);
        if(clip&&!closed){
            clip(width, height, clip_len, tolerance);
        }else{
            hole(width, height, closed);
        }
	}
    
    //outline(width, clip_len, height, radius, l1, under);
    // commented the following, and moved it outside.
    //if(clip&&!closed) translate([0, 2+height+len/2, (len/10)/2])rotate([90, 0, 0])clip(width, height, clip_len);
}

// show three chain-links connected at maximum bending angles
module debug(width, length, height, under_angle, over_angle, inner_axis, closed)
{
	thick = min(2,max(1, 0.1*width));
	radius = height / 2;
	len    = max(length, 2*(height+thick));
	l1     = len - (2 * radius);
	y_ofs  = (l1 / 2) + 0.1;
	z_ofs  = radius;

	chain_link(width, length, height, under_angle, over_angle, inner_axis, closed);
	translate(v = [0, -y_ofs,z_ofs]) rotate(a = [min(max_angle, under_angle),0,0]) translate(v = [0,-y_ofs,-z_ofs]) chain_link(width, length, height, under_angle, over_angle, inner_axis, closed);
	translate(v = [0, y_ofs,z_ofs]) rotate(a = [min(max_angle, over_angle),0,0]) translate(v = [0,y_ofs,-z_ofs]) chain_link(width, length, height, under_angle, over_angle, inner_axis, closed);
}
//debug(15, 18, 10, 30, 30, true, false);

//Multicolor Block or Chain Link
if(multicolor_block){
    translate([0, 0, height/2])cube([width+2, length+2, mcb_height], center = true);
}else{
    //Old
    //chain_link(width= 30, length=45, height=15, under_angle=0, over_angle=30, inner_axis=false, closed=false , clip=true);
    // New - Changed for Customizer compatibility
    chain_link(width, length, height, under_angle, over_angle, inner_axis, closed , clip);
    if(clip&&!closed) translate([0, length, 0.5*length/10]) rotate([90,0,0]) clip(width+clip_extra_width, height, length, tol=-clip_extra_tolerance);
}
